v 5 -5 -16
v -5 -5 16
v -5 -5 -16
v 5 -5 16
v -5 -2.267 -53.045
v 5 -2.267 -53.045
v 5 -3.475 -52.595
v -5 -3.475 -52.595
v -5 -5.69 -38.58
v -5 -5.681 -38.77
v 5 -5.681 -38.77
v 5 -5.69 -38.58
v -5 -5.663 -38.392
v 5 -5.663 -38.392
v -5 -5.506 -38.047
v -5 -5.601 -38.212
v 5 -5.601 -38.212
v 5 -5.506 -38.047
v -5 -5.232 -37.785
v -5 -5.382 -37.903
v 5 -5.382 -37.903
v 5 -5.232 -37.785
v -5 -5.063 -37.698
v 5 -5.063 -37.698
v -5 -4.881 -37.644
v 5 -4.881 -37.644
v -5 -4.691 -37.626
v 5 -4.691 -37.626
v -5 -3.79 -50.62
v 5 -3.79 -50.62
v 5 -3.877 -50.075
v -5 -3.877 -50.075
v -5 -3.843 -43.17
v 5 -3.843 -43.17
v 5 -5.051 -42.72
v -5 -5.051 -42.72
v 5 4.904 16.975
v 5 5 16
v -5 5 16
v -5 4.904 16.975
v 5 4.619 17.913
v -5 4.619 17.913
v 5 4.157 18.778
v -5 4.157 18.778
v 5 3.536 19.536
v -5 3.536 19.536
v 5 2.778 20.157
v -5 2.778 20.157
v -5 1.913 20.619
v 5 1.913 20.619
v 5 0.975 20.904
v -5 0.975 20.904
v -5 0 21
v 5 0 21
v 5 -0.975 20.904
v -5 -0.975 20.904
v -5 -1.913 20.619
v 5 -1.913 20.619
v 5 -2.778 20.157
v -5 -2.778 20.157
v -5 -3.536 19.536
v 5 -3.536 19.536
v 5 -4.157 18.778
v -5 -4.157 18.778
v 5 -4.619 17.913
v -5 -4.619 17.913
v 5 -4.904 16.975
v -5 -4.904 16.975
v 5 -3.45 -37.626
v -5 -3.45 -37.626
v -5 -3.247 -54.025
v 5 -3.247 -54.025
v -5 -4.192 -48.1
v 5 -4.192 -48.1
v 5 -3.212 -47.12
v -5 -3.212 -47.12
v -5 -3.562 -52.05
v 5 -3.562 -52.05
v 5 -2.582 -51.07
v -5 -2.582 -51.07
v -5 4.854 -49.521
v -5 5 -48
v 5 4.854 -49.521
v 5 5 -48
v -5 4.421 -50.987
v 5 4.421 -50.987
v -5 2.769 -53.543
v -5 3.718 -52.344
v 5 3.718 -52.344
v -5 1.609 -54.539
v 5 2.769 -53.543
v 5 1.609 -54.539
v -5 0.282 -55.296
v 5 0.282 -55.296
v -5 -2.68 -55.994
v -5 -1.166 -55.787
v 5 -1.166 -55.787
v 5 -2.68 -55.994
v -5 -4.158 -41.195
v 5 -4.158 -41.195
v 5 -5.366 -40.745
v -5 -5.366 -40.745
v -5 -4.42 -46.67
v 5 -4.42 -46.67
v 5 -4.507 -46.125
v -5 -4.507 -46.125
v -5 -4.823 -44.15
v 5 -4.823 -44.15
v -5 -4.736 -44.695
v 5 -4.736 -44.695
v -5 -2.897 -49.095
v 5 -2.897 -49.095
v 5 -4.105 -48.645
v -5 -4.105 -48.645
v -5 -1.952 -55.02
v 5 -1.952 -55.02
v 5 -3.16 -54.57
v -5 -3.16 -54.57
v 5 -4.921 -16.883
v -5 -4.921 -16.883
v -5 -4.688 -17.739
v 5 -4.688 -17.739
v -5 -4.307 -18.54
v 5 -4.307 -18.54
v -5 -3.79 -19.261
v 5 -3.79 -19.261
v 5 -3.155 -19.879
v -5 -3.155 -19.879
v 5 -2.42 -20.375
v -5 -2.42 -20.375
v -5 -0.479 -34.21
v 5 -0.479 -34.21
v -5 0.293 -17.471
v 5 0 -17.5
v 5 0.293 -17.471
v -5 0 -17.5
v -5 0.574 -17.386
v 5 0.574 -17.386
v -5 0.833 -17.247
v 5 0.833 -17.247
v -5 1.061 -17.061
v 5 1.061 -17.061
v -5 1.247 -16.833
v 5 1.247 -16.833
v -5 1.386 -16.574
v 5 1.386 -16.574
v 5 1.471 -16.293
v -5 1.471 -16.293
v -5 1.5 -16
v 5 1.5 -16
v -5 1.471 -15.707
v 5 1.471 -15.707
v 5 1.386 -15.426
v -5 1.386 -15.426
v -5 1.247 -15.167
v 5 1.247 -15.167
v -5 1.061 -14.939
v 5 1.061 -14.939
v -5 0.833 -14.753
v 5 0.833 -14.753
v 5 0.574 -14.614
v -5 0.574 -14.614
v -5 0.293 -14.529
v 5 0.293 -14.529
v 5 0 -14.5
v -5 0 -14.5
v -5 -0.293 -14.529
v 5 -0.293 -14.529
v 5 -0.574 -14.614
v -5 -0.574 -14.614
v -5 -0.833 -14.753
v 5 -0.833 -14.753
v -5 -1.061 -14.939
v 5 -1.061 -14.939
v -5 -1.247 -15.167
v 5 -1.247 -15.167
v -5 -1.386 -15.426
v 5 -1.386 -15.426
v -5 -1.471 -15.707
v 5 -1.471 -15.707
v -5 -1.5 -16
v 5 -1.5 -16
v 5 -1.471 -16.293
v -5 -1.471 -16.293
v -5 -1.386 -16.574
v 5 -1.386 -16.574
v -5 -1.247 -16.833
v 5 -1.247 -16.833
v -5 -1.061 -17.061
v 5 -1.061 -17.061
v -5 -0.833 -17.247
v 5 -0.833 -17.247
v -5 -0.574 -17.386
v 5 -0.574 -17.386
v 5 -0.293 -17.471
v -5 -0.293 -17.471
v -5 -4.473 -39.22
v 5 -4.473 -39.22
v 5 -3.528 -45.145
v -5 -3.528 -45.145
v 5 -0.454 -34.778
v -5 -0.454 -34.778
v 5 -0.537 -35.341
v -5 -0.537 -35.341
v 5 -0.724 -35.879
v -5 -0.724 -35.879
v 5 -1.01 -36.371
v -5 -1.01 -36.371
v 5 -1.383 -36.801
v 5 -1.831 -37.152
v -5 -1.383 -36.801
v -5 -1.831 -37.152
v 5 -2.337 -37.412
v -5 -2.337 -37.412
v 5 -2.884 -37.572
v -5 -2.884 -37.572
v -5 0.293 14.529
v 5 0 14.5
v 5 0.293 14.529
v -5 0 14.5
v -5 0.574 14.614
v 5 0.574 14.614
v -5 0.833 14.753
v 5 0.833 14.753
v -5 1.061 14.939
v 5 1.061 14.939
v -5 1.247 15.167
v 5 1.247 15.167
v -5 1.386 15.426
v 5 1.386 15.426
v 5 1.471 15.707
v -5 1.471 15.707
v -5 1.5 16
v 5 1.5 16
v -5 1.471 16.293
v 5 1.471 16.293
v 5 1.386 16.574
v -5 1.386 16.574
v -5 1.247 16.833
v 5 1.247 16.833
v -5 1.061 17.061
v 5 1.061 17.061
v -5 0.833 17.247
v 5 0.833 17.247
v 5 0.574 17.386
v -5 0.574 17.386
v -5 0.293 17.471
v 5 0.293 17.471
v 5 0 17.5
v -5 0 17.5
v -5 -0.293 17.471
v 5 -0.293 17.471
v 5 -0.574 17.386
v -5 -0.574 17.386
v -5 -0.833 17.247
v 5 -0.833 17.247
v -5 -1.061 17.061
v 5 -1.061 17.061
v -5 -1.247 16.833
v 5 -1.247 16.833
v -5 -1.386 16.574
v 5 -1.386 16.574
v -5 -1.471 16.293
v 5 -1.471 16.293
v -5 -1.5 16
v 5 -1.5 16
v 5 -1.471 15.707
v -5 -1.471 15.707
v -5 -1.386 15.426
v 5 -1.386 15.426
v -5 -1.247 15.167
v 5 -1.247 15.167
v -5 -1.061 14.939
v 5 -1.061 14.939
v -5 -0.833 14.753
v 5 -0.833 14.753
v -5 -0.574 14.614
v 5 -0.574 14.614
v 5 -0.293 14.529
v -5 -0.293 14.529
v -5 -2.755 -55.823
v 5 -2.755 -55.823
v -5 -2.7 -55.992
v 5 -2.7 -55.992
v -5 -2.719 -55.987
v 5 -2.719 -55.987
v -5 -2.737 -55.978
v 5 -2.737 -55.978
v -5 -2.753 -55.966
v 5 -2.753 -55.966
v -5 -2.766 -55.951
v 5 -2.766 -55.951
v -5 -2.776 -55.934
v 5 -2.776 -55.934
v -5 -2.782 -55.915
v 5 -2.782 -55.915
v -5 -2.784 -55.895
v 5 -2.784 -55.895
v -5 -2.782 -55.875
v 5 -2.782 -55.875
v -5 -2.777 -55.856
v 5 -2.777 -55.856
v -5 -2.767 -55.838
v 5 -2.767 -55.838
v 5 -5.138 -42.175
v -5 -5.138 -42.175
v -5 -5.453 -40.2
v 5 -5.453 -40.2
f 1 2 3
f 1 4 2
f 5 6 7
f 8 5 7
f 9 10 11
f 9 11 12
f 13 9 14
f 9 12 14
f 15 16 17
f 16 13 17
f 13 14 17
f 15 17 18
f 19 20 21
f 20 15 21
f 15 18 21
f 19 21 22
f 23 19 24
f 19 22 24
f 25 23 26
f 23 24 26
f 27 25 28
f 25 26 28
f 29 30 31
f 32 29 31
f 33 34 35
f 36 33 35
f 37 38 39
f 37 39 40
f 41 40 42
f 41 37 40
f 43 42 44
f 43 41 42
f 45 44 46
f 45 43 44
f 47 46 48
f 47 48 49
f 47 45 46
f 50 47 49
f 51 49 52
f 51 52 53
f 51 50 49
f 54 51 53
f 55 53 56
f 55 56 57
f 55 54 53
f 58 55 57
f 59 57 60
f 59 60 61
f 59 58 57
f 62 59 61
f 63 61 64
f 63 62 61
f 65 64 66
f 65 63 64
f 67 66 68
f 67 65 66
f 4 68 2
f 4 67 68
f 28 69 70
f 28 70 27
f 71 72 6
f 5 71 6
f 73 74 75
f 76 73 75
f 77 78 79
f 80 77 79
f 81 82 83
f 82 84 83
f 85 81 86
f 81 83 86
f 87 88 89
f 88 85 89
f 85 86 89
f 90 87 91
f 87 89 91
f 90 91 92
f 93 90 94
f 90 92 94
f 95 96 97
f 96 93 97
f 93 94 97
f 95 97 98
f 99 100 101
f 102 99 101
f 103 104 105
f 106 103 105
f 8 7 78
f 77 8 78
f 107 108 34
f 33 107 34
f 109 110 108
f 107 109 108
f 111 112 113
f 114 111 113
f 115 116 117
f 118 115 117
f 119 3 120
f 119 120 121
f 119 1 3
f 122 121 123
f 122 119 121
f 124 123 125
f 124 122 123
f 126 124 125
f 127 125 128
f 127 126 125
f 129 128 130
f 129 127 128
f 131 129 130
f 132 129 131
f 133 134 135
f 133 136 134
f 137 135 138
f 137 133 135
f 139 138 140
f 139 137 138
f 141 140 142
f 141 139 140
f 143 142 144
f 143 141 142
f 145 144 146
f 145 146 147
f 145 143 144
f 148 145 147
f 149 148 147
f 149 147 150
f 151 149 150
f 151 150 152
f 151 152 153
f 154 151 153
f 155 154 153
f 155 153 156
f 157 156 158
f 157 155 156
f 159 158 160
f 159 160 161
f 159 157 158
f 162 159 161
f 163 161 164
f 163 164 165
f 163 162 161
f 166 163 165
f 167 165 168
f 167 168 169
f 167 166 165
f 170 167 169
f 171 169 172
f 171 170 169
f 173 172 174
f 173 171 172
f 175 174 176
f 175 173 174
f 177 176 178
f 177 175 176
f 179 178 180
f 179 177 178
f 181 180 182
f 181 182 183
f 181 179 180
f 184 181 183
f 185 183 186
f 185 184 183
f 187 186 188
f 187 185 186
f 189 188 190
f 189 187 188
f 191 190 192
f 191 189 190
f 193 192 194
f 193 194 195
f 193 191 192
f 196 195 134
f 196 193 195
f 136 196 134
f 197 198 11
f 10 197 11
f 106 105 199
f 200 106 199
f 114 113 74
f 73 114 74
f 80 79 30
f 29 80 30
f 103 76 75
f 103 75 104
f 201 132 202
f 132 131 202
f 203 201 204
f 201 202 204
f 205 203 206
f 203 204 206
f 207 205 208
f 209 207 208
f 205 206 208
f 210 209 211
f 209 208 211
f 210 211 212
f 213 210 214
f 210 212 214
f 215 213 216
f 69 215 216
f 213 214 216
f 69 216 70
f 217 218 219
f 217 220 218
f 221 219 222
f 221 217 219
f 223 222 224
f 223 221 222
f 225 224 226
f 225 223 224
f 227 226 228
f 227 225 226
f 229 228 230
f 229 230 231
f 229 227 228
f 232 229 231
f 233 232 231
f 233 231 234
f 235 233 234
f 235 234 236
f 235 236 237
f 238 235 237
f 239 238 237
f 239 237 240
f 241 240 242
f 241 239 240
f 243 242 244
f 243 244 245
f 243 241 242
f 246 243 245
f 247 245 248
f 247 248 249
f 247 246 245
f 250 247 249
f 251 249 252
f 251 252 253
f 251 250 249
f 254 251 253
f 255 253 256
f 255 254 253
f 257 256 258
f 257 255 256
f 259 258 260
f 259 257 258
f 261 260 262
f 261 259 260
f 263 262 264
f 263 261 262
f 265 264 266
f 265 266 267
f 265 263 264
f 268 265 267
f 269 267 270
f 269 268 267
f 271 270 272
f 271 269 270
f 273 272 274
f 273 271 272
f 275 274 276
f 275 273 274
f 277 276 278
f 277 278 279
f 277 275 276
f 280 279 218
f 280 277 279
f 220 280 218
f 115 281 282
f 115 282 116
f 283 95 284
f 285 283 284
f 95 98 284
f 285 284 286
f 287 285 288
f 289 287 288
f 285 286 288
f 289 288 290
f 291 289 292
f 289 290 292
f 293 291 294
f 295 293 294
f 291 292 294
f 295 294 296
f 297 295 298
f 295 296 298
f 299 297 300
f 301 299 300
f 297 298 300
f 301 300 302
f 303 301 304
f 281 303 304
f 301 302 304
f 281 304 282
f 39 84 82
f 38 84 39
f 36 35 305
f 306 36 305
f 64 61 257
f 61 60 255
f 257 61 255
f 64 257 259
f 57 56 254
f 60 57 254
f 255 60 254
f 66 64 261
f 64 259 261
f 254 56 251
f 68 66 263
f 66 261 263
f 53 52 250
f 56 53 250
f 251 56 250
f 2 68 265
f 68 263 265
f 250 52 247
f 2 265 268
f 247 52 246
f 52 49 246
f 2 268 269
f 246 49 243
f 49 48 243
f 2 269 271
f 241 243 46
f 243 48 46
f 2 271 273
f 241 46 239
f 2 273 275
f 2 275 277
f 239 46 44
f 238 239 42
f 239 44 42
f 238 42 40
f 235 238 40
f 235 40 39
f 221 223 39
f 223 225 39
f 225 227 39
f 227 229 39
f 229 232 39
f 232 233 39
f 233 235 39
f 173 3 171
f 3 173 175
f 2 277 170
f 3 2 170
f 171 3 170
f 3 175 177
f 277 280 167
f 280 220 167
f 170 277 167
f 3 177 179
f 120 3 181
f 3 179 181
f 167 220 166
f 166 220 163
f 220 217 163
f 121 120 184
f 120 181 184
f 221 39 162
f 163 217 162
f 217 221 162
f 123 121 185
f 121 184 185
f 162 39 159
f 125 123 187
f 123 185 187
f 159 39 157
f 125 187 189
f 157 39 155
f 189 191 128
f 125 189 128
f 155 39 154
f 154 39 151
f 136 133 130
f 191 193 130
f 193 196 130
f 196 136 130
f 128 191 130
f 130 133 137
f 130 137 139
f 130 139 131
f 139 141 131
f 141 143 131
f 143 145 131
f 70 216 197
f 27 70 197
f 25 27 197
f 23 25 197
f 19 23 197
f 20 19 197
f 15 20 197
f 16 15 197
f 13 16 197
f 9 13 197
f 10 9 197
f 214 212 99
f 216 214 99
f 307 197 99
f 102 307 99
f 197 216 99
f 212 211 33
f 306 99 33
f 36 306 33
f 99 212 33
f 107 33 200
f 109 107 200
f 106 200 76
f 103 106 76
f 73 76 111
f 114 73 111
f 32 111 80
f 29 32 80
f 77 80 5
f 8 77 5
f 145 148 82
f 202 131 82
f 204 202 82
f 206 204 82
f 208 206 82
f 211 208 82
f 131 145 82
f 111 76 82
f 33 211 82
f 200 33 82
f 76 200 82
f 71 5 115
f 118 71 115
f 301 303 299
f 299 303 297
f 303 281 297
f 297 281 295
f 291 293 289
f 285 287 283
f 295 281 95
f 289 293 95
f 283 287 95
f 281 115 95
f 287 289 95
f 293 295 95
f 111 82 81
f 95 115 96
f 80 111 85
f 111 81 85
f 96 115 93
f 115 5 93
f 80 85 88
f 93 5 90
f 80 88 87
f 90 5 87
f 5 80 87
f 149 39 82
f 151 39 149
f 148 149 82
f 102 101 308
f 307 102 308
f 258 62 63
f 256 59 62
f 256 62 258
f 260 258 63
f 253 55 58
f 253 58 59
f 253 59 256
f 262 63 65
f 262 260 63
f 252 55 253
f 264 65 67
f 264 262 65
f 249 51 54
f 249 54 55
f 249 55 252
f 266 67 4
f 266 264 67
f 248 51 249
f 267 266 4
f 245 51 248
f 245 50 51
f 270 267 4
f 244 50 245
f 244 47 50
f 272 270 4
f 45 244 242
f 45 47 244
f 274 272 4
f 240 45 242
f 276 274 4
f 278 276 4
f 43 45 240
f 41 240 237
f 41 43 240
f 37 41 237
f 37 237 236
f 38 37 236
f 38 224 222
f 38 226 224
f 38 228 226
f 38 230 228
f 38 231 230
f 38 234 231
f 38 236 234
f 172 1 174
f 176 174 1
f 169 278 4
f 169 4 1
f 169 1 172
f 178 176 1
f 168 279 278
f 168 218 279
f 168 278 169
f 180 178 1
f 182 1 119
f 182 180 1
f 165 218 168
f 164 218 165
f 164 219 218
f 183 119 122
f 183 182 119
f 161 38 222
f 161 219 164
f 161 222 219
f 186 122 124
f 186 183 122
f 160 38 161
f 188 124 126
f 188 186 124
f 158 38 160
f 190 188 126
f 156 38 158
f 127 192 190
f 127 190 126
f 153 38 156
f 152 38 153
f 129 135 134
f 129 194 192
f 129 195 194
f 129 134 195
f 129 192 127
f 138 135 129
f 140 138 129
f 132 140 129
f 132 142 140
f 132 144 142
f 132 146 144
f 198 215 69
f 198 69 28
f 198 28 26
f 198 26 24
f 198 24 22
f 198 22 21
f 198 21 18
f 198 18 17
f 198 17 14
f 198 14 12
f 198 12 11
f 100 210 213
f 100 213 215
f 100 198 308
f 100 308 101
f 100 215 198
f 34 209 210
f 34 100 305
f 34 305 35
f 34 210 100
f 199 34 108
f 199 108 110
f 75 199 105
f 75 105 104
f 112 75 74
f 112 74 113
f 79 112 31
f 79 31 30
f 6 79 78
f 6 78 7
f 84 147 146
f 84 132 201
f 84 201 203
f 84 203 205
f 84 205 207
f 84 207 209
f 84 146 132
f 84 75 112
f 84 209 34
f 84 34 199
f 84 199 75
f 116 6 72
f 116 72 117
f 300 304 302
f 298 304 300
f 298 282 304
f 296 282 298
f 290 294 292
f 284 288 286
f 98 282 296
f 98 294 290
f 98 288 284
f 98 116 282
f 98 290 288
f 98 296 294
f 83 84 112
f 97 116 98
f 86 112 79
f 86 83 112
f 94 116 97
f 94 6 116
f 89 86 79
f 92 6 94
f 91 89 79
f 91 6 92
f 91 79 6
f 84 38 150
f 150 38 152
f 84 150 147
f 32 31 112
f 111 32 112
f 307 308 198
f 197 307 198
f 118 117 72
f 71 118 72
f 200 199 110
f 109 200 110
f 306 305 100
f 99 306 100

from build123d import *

# Parameters (mm, degrees)
SKETCH1_R           = 5
SKETCH1_R_2         = 1.5
BOSS_EXTRUDE1_DEPTH = 5
BOSS_EXTRUDE4_DEPTH = 10
FILLET5_R           = 3
FILLET7_R           = 8
CUT_EXTRUDE6_DEPTH  = 10
FILLET9_R           = 1
FILLET11_R          = 0.1


with BuildPart() as part:
    # Sketch1 → Boss-Extrude1 (new, symmetric)
    # profile 1 of 3: a face of its own
    with BuildSketch(Plane(origin=(0, 0, 0), x_dir=(0, 0, -1), z_dir=(1, 0, 0))):
        with BuildLine():
            ThreePointArc((-11, 0), (-12.464466094, -3.535533906), (-16, -5))
            Line((-16, -5), (16, -5))
            ThreePointArc((16, -5), (11, 0), (16, 5))
            Line((16, 5), (-16, 5))
            ThreePointArc((-16, 5), (-12.464466094, 3.535533906), (-11, 0))
        make_face()
    # profile 2 of 3: a face of its own
    with BuildSketch(Plane(origin=(0, 0, 0), x_dir=(0, 0, -1), z_dir=(1, 0, 0))):
        with Locations((-16, 0)):
            Circle(SKETCH1_R)
        with Locations((-16, 0)):
            Circle(SKETCH1_R_2, mode=Mode.SUBTRACT)
    # profile 3 of 3: a face of its own
    with BuildSketch(Plane(origin=(0, 0, 0), x_dir=(0, 0, -1), z_dir=(1, 0, 0))):
        with Locations((16, 0)):
            Circle(SKETCH1_R)
        with Locations((16, 0)):
            Circle(SKETCH1_R_2, mode=Mode.SUBTRACT)
    extrude(amount=BOSS_EXTRUDE1_DEPTH, both=True)

    # Sketch6 → Boss-Extrude4 (add)
    with BuildSketch(Plane(origin=(5, 0, 0), x_dir=(0, 0, -1), z_dir=(1, 0, 0))):
        with BuildLine():
            Line((20.375428035, -2.419840804), (37.626356882, 0))
            Line((37.626356882, 0), (37.626356882, -5.863506349))
            Line((37.626356882, -5.863506349), (56, -2.931753174))
            Line((56, -2.931753174), (56, -0.788607304))
            Line((56, -0.788607304), (56, 5))
            Line((56, 5), (16, 5))
            ThreePointArc((16, 5), (20.30692489, 2.539763373), (20.375428035, -2.419840804))
        make_face()
    extrude(amount=-BOSS_EXTRUDE4_DEPTH)

    # Fillet5
    fillet5_edges = [part.edges().sort_by_distance(p)[0] for p in [
        (0, 0, -37.626356882),
    ]]
    fillet(fillet5_edges, radius=FILLET5_R)

    # Fillet7
    # the kernel refuses this fillet: 8 mm, written as the material it takes off along each edge
    with BuildSketch(Plane(origin=(25, 5, -56), x_dir=(0, -1, 0), z_dir=(-1, 0, 0))) as fillet7_piece_1:
        with BuildLine():
            CenterArc((FILLET7_R, FILLET7_R), FILLET7_R, 180, 90)
            Line((0, FILLET7_R), (0, 0))
            Line((0, 0), (FILLET7_R, 0))
        make_face()
    extrude(amount=50, mode=Mode.SUBTRACT)

    # Sketch8 → Cut-Extrude6 (cut)
    with BuildSketch(Plane(origin=(5, 0, 0), x_dir=(0, 0, -1), z_dir=(1, 0, 0))):
        Polygon((56, -2.931753174), (55.020132037, -1.951885211), (54.570397118, -3.159864865), (54.024984262, -3.246892563), (53.045116299, -2.2670246), (52.59538138, -3.475004253), (52.049968524, -3.562031952), (51.070100561, -2.582163988), (50.620365642, -3.790143642), (50.074952786, -3.87717134), (49.095084823, -2.897303377), (48.645349904, -4.10528303), (48.099937048, -4.192310729), (47.120069084, -3.212442766), (46.670334166, -4.420422419), (46.12492131, -4.507450118), (45.145053346, -3.527582154), (44.695318427, -4.735561808), (44.149905571, -4.822589506), (43.170037608, -3.842721543), (42.720302689, -5.050701196), (42.174889833, -5.137728895), (41.19502187, -4.157860932), (40.745286951, -5.365840585), (40.199874095, -5.452868283), (39.220006132, -4.47300032), (38.770271213, -5.680979974), (37.626356882, -5.863506349), (46.12492131, -12.960580579), align=None)
    extrude(amount=-CUT_EXTRUDE6_DEPTH, mode=Mode.SUBTRACT)

    # Fillet9
    # the kernel refuses this fillet: 1 mm, written as the material it takes off along each edge
    with BuildSketch(Plane(origin=(7.930532836, -5.863506349, -37.626356882), x_dir=(0, 0.15756969432487367, -0.9875078690473135), z_dir=(-1, 0, 0))) as fillet9_piece_1:
        with BuildLine():
            CenterArc((FILLET9_R * 1.1722131343, -FILLET9_R), FILLET9_R, 90, 99.065860636)
            Line((FILLET9_R * 0.184705265256, -FILLET9_R * 1.15756969432), (0, 0))
            Line((0, 0), (FILLET9_R * 1.1722131343, 0))
        make_face()
    extrude(amount=15.861065672, mode=Mode.SUBTRACT)

    # Fillet11
    fillet11_edges = [part.edges().sort_by_distance(p)[0] for p in [
        (0, -2.931459557, -55.999706383),
    ]]
    fillet(fillet11_edges, radius=FILLET11_R)


solid = part.part
